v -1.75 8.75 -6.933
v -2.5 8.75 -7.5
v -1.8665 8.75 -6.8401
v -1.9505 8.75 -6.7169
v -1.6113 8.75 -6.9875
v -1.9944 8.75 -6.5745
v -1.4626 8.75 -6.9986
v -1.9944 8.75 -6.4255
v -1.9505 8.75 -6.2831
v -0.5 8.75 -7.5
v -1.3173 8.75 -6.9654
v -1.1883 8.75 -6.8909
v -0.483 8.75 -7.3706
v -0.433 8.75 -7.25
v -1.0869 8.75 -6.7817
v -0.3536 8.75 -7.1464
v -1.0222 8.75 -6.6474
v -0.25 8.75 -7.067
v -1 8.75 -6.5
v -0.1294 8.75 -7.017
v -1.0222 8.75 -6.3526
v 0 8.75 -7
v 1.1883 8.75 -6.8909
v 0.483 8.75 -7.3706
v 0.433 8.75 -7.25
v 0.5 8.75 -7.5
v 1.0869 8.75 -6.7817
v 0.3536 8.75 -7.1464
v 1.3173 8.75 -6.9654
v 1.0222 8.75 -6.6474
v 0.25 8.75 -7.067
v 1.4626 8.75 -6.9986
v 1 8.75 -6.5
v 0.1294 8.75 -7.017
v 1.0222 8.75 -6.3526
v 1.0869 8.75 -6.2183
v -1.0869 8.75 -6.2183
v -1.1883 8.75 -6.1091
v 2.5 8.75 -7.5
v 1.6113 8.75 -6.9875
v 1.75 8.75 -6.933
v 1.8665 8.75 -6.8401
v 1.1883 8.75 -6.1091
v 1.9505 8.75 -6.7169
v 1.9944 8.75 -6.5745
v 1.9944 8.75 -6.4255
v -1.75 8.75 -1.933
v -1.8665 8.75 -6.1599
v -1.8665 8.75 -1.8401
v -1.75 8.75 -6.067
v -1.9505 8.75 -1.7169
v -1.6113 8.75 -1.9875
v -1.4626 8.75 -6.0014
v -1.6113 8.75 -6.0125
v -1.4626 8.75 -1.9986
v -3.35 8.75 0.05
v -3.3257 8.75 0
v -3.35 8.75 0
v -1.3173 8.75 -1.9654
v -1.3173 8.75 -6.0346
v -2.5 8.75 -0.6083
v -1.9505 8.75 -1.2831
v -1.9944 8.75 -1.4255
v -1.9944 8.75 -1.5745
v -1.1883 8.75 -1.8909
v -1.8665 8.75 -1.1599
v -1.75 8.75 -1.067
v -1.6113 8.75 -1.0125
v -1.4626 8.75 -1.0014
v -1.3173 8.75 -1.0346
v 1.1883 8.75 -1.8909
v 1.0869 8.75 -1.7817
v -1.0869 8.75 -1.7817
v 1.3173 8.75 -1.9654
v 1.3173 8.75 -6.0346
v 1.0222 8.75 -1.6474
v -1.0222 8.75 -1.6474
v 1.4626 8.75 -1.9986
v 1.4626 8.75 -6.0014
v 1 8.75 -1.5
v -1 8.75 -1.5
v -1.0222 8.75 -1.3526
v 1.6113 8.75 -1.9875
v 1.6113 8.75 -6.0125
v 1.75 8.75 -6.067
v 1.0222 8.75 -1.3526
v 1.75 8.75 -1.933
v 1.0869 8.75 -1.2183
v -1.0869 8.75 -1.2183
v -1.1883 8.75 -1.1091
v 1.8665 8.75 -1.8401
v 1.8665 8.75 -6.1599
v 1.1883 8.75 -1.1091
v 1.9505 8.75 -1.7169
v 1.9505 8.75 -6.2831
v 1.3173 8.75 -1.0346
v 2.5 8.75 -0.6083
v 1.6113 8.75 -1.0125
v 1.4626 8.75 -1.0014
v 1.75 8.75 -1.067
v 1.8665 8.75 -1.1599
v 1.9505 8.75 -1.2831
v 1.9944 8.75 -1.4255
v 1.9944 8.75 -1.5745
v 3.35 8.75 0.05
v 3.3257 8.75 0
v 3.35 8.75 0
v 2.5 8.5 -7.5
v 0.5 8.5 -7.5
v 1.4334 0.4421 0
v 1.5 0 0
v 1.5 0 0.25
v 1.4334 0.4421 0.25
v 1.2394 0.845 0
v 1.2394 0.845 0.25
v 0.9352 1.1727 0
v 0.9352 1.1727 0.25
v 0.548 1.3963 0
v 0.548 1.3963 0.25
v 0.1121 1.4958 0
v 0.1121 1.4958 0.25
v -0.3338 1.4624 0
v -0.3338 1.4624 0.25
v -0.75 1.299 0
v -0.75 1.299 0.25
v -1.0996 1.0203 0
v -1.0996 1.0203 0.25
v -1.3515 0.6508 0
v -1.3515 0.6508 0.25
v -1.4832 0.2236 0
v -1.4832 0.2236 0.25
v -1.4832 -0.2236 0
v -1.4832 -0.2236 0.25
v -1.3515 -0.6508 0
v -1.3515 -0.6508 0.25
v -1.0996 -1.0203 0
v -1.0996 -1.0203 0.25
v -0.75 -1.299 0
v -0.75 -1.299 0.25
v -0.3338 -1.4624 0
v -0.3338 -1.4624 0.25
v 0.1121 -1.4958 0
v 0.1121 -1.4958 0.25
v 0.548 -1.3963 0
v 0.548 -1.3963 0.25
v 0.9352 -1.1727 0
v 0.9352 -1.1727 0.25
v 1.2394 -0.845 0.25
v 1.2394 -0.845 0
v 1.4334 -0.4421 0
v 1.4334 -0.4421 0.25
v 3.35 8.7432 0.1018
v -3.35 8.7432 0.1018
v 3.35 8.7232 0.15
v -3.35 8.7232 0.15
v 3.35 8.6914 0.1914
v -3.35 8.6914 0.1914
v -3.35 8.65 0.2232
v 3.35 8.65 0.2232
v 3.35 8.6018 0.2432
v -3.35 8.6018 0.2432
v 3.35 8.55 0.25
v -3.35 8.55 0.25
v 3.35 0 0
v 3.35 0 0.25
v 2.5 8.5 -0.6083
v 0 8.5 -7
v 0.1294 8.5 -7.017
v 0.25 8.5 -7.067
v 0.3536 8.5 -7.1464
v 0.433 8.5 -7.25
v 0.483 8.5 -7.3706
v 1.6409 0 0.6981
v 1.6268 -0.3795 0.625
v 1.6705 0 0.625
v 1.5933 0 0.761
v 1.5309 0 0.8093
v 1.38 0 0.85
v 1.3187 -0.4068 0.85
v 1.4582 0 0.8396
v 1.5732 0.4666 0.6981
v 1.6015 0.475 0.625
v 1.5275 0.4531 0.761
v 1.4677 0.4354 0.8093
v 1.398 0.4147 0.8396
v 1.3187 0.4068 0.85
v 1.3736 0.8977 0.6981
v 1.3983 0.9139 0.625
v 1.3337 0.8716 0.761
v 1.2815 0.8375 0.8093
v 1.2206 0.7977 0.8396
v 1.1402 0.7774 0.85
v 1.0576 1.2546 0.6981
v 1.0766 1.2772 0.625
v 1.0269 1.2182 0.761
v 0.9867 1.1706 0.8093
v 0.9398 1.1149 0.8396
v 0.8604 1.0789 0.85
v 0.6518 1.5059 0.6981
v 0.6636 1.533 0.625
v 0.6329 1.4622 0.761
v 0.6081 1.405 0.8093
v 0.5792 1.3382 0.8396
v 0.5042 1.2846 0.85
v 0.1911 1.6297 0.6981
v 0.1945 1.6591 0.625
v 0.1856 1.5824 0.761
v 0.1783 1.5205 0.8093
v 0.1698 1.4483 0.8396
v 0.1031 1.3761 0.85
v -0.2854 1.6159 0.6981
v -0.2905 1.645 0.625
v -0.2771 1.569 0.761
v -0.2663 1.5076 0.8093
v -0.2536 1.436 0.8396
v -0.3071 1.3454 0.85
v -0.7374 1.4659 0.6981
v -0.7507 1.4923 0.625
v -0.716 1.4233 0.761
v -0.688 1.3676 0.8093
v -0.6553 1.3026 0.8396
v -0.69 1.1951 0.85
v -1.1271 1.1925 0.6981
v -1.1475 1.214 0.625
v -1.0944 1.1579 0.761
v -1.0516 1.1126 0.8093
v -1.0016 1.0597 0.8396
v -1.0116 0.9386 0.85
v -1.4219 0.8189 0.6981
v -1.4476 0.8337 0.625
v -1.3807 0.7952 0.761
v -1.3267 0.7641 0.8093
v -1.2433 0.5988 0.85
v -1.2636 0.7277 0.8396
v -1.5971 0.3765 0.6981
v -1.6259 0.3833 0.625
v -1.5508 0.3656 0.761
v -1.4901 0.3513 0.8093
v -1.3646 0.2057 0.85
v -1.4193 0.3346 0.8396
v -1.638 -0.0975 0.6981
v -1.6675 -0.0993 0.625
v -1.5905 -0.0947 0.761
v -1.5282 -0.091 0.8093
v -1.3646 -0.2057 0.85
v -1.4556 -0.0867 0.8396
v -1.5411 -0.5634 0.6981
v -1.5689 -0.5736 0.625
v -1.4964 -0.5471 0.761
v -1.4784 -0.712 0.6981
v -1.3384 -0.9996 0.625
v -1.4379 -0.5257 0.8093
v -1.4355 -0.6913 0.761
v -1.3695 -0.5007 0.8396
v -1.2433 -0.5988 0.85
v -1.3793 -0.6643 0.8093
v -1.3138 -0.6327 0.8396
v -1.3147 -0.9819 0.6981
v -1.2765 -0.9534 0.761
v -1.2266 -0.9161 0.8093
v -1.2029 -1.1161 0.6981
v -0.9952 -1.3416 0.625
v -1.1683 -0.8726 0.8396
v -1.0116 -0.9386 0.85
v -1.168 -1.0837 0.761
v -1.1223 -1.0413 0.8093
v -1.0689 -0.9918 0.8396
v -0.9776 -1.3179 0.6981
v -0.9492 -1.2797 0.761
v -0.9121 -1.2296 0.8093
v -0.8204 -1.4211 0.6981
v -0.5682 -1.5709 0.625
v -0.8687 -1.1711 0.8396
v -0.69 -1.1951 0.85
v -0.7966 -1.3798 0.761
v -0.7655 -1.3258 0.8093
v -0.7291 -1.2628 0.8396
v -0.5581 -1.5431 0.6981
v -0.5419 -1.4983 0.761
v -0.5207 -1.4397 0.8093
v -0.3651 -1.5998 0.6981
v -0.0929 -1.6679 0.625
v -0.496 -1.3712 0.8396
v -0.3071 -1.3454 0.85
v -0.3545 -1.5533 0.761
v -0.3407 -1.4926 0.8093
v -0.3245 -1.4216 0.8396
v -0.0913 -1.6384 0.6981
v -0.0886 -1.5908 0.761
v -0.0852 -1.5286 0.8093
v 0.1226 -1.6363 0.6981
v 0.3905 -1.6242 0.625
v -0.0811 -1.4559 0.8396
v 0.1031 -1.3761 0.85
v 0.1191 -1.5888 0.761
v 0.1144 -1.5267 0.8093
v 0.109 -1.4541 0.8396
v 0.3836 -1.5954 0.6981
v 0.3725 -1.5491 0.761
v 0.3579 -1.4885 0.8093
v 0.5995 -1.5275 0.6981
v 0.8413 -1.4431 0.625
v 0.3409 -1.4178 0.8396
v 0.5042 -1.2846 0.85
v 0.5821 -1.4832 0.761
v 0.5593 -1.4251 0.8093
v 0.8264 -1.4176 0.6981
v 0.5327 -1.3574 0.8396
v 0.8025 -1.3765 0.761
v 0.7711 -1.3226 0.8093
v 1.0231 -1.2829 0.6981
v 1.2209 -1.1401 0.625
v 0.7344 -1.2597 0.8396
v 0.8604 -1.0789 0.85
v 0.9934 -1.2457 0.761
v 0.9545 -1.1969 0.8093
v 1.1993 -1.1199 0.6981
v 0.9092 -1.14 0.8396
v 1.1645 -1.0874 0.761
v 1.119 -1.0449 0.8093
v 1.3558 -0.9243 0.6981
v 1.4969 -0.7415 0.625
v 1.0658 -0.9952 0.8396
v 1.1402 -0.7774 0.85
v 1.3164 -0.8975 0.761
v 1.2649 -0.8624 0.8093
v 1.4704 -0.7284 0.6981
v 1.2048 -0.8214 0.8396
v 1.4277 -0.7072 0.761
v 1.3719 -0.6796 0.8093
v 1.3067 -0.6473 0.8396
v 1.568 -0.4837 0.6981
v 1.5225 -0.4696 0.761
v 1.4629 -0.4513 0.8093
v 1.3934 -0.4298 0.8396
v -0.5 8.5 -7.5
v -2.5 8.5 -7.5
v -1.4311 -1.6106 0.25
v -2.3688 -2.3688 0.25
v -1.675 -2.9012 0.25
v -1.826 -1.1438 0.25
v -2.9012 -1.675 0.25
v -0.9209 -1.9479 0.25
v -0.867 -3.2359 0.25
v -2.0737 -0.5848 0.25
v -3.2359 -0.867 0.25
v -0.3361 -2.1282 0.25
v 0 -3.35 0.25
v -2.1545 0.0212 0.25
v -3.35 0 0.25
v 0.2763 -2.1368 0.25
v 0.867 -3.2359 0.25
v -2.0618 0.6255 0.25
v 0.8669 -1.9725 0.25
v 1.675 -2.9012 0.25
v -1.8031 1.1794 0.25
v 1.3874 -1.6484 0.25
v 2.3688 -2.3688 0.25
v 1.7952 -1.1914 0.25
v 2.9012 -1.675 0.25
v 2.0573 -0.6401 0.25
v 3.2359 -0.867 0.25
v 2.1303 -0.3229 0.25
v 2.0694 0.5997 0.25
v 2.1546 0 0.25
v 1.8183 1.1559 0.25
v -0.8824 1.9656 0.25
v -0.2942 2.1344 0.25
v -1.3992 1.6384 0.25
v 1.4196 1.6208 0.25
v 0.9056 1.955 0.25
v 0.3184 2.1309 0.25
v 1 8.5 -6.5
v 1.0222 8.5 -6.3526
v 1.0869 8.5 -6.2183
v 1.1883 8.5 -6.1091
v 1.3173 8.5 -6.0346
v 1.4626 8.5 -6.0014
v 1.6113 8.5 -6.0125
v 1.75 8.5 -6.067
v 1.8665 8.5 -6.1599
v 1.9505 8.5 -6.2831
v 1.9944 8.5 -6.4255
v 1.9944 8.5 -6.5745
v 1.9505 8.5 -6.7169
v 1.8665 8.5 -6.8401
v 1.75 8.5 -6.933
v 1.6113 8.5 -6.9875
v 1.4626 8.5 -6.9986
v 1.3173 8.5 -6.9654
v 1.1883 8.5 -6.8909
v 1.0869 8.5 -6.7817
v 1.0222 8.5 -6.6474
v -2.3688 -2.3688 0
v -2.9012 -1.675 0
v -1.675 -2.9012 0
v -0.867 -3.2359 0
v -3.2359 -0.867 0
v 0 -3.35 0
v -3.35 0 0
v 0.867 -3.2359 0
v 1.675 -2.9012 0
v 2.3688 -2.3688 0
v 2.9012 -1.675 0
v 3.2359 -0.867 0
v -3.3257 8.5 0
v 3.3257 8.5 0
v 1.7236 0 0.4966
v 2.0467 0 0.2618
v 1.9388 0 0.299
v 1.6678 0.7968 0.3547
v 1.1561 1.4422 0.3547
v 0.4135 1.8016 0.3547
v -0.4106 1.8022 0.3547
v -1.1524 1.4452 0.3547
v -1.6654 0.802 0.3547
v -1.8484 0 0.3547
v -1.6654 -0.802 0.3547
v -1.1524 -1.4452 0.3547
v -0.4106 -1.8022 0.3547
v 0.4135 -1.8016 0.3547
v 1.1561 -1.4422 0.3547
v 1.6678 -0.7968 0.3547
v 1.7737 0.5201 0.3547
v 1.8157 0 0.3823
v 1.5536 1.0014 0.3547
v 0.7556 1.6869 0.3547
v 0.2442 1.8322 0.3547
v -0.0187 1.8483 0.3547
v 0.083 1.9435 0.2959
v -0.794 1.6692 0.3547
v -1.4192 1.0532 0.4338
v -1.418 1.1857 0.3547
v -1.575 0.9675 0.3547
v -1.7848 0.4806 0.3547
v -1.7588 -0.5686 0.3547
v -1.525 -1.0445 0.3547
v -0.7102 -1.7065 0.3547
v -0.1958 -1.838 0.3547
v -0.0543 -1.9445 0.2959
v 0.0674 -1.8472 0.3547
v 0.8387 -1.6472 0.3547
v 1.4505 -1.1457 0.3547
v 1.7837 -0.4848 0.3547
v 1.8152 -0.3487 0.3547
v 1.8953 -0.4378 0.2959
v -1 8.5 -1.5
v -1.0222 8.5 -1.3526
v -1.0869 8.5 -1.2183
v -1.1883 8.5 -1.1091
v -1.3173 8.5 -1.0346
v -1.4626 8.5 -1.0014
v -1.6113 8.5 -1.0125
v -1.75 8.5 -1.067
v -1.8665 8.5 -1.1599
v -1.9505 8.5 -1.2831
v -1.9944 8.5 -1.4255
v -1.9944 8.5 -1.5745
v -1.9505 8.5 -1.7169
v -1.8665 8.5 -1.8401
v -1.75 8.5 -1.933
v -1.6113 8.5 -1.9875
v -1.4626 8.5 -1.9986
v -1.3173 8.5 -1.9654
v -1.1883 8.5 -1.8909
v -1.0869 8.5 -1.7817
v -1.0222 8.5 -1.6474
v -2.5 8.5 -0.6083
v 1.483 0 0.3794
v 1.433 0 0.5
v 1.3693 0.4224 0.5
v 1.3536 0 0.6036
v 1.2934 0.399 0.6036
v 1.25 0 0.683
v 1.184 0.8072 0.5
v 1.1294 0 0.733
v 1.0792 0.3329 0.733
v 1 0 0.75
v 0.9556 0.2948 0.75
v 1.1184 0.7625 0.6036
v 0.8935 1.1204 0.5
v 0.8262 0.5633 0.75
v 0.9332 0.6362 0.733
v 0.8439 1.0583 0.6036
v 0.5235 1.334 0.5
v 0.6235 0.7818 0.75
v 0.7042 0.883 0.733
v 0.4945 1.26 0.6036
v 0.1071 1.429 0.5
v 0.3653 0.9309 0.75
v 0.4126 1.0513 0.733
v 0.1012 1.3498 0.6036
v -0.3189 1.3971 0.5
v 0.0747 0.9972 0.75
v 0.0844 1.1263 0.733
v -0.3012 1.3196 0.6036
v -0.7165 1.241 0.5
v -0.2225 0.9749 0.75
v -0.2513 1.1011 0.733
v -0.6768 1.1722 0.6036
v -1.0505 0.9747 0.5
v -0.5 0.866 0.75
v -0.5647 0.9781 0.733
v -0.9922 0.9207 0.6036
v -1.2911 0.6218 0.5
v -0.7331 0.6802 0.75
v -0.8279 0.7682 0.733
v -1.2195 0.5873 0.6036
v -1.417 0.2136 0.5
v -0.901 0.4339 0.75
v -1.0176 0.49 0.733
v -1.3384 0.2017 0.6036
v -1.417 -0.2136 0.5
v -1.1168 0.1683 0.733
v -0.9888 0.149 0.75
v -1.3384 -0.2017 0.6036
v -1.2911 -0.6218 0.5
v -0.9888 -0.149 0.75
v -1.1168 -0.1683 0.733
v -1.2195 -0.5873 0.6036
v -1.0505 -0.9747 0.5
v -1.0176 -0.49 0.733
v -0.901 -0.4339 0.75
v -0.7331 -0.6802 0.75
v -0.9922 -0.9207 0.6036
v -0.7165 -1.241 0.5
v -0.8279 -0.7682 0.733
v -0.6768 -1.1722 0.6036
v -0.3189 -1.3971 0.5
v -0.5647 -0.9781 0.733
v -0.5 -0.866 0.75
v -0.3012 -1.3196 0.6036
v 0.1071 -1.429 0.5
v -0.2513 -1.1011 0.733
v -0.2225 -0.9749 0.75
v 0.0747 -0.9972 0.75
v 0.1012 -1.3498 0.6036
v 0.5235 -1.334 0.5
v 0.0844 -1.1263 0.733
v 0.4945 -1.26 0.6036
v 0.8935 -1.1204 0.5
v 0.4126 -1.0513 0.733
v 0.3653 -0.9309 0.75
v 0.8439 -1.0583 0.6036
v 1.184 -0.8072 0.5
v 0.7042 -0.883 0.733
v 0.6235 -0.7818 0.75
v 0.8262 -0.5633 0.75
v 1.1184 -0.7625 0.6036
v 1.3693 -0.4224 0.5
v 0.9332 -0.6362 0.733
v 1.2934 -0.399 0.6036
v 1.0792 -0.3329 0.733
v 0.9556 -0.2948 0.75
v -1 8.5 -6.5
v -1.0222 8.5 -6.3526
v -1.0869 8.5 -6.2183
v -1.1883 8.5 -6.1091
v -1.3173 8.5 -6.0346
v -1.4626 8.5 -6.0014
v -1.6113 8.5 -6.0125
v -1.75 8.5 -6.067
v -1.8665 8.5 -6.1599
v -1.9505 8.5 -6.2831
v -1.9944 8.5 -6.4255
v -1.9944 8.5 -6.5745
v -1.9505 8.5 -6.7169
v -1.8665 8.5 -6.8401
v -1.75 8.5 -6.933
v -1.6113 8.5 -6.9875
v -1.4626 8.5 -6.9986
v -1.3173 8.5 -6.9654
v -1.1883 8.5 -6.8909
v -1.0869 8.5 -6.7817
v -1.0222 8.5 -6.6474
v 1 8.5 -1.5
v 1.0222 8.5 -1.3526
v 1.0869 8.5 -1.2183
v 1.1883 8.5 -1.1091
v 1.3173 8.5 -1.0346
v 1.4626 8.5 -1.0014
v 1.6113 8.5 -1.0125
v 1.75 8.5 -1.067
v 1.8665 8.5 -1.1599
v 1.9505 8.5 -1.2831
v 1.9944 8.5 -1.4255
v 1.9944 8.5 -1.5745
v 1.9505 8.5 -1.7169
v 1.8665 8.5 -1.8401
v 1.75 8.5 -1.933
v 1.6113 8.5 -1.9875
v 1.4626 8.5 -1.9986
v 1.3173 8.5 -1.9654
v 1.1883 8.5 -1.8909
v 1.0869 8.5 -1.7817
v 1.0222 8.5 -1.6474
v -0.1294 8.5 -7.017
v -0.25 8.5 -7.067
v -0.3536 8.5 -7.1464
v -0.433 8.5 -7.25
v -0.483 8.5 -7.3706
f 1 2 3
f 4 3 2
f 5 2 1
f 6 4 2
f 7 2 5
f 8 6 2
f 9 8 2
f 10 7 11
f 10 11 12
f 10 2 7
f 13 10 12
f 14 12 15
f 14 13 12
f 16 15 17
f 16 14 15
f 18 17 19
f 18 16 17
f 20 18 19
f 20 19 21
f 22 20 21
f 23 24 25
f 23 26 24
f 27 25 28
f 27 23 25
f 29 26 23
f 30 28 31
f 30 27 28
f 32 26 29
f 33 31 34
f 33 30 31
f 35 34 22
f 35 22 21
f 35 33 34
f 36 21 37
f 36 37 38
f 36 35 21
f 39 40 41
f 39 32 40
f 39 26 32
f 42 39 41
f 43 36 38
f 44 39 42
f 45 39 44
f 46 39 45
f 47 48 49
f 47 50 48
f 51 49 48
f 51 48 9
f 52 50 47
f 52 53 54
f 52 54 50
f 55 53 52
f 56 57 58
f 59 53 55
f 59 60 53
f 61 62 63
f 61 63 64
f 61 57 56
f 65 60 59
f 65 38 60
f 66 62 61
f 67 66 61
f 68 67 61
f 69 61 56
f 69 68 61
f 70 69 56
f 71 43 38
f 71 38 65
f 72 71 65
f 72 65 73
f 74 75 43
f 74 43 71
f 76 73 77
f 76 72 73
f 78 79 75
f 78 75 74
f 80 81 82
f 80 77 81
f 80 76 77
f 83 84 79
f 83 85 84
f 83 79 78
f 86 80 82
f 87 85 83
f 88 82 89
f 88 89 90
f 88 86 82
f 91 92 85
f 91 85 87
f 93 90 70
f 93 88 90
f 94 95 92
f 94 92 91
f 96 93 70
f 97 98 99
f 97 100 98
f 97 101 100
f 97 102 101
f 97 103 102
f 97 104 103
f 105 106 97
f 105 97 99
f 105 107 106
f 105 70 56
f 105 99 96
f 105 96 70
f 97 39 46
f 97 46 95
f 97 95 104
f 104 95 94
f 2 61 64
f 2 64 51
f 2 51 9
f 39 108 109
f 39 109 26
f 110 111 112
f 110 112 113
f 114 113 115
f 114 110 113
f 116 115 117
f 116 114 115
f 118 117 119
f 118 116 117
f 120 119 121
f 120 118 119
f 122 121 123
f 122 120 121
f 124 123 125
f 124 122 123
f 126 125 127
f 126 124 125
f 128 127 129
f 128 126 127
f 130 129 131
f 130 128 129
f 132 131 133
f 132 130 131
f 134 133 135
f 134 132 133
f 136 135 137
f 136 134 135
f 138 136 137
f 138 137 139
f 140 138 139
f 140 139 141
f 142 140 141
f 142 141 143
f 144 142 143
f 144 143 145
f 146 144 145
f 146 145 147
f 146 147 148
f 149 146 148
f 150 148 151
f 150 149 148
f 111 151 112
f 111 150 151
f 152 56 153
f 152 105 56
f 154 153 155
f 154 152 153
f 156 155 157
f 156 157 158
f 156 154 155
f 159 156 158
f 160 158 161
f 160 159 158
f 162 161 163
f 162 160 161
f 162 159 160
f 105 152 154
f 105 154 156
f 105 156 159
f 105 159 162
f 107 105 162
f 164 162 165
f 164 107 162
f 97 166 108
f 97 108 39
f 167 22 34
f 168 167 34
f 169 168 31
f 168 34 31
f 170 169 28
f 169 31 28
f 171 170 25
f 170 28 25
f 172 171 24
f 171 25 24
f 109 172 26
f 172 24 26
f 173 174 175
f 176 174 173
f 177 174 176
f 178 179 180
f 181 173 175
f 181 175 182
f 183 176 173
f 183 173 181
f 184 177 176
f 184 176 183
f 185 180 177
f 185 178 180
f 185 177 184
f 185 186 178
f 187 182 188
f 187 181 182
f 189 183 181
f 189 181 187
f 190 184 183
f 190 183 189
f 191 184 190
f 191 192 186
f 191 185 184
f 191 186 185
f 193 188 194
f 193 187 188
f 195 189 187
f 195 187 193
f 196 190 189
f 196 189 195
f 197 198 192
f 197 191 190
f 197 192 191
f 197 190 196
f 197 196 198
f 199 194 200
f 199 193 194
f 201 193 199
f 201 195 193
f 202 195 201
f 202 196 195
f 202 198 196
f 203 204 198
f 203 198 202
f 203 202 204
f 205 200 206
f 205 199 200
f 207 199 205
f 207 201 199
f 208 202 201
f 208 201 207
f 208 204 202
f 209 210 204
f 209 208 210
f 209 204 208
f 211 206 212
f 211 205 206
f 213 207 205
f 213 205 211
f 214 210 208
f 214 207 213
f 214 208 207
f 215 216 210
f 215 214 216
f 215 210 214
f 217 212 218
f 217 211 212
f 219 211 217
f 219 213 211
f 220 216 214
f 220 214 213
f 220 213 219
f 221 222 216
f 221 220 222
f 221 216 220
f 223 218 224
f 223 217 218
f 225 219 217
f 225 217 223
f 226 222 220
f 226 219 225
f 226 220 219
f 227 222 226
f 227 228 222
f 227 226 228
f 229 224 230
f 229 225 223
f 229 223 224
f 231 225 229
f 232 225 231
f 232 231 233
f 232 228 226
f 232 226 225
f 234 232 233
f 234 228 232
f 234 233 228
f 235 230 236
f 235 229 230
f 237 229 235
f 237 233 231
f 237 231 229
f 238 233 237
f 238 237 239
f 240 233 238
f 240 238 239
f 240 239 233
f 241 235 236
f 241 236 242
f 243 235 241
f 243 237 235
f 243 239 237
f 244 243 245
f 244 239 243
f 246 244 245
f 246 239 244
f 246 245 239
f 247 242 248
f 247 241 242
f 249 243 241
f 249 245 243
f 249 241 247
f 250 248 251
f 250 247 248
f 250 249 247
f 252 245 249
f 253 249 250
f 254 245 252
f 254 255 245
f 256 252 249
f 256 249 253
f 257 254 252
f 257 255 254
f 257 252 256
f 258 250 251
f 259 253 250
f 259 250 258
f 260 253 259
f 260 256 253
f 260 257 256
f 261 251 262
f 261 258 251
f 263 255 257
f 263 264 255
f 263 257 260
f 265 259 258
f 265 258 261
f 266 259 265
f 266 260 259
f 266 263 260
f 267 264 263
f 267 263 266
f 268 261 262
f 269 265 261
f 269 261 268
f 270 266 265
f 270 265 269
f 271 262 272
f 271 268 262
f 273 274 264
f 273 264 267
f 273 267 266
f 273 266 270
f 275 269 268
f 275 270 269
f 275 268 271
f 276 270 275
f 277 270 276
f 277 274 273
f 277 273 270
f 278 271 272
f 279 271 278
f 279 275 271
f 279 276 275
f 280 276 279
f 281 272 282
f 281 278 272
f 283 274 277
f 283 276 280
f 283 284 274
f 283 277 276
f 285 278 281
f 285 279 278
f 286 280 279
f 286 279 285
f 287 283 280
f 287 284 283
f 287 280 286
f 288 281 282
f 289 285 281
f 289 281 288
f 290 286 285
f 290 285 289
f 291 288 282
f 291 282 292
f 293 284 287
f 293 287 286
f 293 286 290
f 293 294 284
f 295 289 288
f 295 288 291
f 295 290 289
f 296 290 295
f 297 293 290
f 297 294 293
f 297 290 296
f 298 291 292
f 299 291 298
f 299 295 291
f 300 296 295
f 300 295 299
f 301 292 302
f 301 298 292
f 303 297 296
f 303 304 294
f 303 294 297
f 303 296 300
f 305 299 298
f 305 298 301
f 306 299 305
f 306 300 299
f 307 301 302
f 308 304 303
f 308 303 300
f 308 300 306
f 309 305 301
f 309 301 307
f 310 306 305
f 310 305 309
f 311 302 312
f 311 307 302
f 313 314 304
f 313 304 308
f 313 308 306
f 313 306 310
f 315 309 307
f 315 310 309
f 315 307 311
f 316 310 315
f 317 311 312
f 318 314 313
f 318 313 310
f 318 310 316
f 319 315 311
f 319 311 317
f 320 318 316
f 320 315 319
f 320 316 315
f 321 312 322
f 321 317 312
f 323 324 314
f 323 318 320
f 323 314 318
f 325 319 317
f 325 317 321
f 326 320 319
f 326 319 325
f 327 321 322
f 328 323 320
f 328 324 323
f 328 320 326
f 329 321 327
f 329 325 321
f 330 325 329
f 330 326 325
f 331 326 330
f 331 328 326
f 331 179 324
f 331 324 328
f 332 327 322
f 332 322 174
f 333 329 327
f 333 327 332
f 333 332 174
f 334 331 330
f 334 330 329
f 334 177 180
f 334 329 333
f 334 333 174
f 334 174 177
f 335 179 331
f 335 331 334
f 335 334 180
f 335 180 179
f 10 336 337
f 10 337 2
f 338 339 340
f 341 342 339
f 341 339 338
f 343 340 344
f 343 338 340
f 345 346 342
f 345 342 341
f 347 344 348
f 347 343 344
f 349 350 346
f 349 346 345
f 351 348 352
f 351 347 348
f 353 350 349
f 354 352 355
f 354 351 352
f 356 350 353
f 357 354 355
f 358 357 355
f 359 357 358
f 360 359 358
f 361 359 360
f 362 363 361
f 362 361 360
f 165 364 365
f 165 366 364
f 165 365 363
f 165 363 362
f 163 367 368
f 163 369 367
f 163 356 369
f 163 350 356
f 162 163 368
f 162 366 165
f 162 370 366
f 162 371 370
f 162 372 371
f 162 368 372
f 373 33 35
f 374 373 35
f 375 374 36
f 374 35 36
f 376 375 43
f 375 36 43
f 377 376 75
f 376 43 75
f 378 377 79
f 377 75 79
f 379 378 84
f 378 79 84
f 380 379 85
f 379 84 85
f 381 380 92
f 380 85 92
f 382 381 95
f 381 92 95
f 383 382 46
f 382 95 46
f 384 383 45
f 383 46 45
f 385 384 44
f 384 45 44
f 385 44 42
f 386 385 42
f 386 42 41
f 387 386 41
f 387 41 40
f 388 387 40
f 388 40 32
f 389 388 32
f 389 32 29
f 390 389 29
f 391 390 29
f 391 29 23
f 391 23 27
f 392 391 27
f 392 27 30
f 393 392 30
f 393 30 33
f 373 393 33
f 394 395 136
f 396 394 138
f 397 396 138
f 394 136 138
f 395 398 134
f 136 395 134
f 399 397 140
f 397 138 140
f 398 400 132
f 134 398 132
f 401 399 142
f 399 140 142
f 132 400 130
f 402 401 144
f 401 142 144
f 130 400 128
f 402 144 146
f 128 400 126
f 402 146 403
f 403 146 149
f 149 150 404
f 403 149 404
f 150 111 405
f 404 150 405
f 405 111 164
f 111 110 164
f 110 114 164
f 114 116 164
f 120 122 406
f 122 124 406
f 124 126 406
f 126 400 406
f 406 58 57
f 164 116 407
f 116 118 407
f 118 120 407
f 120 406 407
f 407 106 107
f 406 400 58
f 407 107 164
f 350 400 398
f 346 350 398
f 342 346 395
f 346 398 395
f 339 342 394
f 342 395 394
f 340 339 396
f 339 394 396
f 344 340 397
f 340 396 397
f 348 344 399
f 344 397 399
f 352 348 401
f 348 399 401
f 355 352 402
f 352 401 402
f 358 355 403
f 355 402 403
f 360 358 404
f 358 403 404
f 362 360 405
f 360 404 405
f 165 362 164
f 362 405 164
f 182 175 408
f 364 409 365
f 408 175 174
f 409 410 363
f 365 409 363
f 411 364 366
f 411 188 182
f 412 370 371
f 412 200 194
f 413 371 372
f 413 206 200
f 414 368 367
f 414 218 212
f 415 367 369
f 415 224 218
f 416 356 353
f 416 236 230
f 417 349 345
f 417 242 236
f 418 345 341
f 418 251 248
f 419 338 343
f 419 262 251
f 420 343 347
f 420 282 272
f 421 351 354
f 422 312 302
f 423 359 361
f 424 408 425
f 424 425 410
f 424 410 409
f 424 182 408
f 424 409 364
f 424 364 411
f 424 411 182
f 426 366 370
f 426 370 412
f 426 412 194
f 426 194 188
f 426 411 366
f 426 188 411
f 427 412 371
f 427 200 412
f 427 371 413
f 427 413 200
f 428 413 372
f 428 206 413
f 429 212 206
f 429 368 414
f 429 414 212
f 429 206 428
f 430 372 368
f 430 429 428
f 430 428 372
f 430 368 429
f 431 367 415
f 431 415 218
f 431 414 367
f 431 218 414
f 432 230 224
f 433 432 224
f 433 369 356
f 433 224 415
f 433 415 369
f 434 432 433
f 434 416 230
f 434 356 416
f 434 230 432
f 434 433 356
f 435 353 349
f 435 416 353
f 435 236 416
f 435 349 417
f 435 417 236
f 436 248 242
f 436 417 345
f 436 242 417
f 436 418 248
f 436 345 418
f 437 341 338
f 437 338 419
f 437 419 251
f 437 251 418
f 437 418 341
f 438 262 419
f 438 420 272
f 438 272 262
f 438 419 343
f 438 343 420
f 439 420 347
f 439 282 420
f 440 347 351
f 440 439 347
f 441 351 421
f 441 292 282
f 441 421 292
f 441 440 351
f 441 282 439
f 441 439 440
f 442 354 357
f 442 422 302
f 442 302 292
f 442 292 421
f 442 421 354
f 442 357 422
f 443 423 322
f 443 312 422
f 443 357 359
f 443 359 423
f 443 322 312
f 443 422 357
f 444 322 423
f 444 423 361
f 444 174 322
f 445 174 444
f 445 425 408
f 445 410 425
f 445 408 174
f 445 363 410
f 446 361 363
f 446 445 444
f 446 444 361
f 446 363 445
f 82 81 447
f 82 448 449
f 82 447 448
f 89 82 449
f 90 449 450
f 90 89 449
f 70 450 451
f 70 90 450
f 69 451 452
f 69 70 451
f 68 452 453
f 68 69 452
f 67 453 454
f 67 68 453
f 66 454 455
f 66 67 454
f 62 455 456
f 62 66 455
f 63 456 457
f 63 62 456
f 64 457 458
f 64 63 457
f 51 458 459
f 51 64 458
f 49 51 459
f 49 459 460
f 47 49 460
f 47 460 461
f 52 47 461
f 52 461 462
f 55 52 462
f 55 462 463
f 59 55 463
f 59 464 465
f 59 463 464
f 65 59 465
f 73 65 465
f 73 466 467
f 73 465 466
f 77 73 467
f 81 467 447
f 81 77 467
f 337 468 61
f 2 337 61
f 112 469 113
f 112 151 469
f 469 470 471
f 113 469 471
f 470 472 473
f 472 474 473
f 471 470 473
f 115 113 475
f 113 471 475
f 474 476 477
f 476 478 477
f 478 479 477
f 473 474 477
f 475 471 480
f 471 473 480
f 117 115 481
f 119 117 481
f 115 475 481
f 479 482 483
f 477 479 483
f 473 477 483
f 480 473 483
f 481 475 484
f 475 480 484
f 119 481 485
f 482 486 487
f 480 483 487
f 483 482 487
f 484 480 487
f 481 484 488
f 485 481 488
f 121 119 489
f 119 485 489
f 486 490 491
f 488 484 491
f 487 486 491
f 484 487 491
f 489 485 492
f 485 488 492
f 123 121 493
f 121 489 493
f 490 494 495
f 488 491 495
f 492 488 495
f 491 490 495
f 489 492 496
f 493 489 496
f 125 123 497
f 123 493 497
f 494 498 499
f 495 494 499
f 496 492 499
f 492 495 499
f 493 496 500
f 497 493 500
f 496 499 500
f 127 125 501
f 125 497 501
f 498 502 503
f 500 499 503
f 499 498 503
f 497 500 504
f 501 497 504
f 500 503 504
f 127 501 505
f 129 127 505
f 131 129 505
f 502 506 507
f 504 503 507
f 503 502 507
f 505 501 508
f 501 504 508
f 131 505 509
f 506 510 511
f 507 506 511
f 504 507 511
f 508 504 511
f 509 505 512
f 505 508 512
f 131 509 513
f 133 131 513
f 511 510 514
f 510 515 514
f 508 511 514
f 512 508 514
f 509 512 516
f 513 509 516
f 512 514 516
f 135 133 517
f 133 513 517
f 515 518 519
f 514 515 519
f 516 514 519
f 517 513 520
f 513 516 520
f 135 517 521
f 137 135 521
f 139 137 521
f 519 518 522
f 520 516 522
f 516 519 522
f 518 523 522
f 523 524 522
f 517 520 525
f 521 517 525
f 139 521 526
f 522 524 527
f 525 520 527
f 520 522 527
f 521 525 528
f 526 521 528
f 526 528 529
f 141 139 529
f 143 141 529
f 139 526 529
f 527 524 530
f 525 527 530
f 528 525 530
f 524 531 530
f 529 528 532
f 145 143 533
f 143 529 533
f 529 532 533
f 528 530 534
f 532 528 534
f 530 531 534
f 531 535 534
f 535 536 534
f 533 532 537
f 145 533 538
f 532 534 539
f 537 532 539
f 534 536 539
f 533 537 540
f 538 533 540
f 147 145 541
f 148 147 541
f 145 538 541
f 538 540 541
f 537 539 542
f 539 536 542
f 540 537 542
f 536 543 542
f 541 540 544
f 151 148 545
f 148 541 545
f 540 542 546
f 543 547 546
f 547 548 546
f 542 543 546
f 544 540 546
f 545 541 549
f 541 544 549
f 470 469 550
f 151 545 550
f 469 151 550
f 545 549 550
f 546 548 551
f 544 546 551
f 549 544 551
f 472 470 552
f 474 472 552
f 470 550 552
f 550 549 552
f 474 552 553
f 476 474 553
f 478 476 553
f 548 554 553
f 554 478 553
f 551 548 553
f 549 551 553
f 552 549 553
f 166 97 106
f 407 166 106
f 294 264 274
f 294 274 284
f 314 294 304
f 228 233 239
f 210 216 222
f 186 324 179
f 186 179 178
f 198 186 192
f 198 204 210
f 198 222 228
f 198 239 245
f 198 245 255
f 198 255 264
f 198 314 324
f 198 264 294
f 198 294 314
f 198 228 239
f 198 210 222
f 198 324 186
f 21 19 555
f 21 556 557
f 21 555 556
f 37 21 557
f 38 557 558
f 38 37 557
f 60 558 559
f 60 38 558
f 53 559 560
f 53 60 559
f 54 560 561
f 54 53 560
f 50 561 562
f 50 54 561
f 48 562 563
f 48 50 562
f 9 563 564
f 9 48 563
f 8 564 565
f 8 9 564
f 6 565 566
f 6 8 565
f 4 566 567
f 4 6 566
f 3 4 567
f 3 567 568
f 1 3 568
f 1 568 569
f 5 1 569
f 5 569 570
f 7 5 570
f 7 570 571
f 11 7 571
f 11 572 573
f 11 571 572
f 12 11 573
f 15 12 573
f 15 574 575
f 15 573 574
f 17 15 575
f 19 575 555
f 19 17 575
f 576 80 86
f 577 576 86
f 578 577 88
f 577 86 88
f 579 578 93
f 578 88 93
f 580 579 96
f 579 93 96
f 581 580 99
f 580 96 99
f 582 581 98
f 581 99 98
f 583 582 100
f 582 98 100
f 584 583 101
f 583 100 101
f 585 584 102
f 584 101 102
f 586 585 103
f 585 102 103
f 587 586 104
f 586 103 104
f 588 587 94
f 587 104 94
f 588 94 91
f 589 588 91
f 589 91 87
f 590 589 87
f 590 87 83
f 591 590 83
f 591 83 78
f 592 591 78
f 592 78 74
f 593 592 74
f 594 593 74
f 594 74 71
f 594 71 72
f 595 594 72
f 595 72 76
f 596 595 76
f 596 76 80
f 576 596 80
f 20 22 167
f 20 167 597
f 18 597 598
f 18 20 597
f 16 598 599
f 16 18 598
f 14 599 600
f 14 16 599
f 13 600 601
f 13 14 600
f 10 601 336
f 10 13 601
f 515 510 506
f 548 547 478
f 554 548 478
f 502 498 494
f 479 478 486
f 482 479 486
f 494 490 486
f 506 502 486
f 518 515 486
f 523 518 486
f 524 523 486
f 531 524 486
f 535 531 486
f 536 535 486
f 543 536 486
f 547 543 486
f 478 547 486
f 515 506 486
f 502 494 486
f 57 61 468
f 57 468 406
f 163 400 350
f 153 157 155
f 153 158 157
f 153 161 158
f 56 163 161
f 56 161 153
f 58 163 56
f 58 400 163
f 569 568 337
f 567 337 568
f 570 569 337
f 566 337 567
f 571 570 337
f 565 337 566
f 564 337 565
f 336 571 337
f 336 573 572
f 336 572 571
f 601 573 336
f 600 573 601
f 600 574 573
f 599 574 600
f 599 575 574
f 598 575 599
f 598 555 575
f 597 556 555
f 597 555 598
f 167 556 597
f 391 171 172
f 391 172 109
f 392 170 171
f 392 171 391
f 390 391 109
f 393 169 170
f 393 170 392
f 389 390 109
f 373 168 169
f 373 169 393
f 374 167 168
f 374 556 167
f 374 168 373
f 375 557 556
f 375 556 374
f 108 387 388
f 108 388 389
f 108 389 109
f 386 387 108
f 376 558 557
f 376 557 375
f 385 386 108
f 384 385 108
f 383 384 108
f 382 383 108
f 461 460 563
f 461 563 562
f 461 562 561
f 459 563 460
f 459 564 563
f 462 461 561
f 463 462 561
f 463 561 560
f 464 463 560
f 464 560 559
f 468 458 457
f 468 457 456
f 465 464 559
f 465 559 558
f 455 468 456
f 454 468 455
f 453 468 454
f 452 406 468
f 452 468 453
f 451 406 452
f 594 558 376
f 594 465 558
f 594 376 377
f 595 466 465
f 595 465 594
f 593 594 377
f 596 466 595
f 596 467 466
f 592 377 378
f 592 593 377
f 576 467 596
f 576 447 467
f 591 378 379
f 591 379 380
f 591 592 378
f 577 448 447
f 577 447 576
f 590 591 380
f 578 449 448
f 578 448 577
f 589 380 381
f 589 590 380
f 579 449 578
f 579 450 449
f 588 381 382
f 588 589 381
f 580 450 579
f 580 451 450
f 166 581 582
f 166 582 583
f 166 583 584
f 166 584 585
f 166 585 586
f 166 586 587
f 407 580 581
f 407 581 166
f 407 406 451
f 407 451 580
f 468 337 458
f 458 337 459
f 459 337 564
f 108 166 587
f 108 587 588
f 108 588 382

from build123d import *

# Parameters (mm, degrees)
PAD_DEPTH       = 0.25
SKETCH001_R     = 1.675
POCKET_DEPTH    = 5
SKETCH002_R     = 1.68
PAD001_DEPTH    = 0.85
SKETCH003_R     = 1.5
POCKET001_DEPTH = 0.75
FILLET_R        = 0.3
FILLET001_R     = 0.5
FILLET002_R     = 0.5
SKETCH004_W     = 0.25
SKETCH004_H     = 7.75
PAD002_DEPTH    = 2.5
SKETCH005_R     = 0.5
POCKET002_DEPTH = 5
FILLET003_R     = 0.2
PAD003_DEPTH    = 0.25


with BuildPart() as part:
    # Sketch → Pad (new body)
    with BuildSketch(Plane.XY):
        with BuildLine():
            ThreePointArc((-3.35, 0), (0, -3.35), (3.35, 0))
            Line((3.35, 8.75), (3.35, 0))
            Line((-3.35, 8.75), (3.35, 8.75))
            Line((-3.35, 0), (-3.35, 8.75))
        make_face()
    extrude(amount=PAD_DEPTH)

    # Sketch001 → Pocket (cut)
    with BuildSketch(Plane.XY):
        Circle(SKETCH001_R)
    extrude(amount=POCKET_DEPTH, mode=Mode.SUBTRACT)

    # Sketch002 (on DatumPlane) → Pad001 (join)
    with BuildSketch(Plane.XY.offset(0.85)):
        Circle(SKETCH002_R)
    extrude(amount=-PAD001_DEPTH)

    # Sketch003 → Pocket001 (cut)
    with BuildSketch(Plane.XY):
        Circle(SKETCH003_R)
    extrude(amount=POCKET001_DEPTH, mode=Mode.SUBTRACT)

    # Fillet
    fillet_edges = [part.edges().sort_by_distance(p)[0] for p in [
        (-1.68, 0, 0.85),
    ]]
    fillet(fillet_edges, radius=FILLET_R)

    # Fillet001
    fillet001_edges = [part.edges().sort_by_distance(p)[0] for p in [
        (-1.68, 0, 0.25),
    ]]
    fillet(fillet001_edges, radius=FILLET001_R)

    # Fillet002
    fillet002_edges = [part.edges().sort_by_distance(p)[0] for p in [
        (-1.5, 0, 0.75),
    ]]
    fillet(fillet002_edges, radius=FILLET002_R)

    # Sketch004 → Pad002 (join, symmetric)
    with BuildSketch(Plane.YZ):
        with Locations((8.625, -3.625)):
            Rectangle(SKETCH004_W, SKETCH004_H)
    extrude(amount=PAD002_DEPTH, both=True)

    # Sketch005 (on DatumPlane) → Pocket002 (cut)
    with BuildSketch(Plane.XZ.offset(-8.75)):
        with Locations((-1.5, -1.5)):
            Circle(SKETCH005_R)
        with Locations((-1.5, -6.5)):
            Circle(SKETCH005_R)
        with BuildLine():
            ThreePointArc((0, -7), (-0.353553, -7.146447), (-0.5, -7.5))
            Line((-0.5, -7.5), (0, -7.5))
            Line((0, -7), (0, -7.5))
        make_face()
    pocket002 = extrude(amount=POCKET002_DEPTH, mode=Mode.SUBTRACT)

    # Mirrored: Pocket002 across Sketch005 V_Axis
    add(pocket002.mirror(Plane(origin=(0, 8.75, 0), x_dir=(0, -1, 0), z_dir=(1, 0, 0))), mode=Mode.SUBTRACT)

    # Fillet003
    fillet003_edges = [part.edges().sort_by_distance(p)[0] for p in [
        (0, 8.75, 0.25),
    ]]
    fillet(fillet003_edges, radius=FILLET003_R)

    # Sketch006 (on DatumPlane) → Pad003 (join)
    with BuildSketch(Plane.XZ.offset(-8.75)):
        Polygon((-2.433517, -0.657248), (-3.325729, 0), (-2.433517, 0), align=None)
    pad003 = extrude(amount=PAD003_DEPTH)

    # Mirrored001: Pad003 across Sketch006 V_Axis
    add(pad003.mirror(Plane(origin=(0, 8.75, 0), x_dir=(0, -1, 0), z_dir=(1, 0, 0))))


solid = part.part
